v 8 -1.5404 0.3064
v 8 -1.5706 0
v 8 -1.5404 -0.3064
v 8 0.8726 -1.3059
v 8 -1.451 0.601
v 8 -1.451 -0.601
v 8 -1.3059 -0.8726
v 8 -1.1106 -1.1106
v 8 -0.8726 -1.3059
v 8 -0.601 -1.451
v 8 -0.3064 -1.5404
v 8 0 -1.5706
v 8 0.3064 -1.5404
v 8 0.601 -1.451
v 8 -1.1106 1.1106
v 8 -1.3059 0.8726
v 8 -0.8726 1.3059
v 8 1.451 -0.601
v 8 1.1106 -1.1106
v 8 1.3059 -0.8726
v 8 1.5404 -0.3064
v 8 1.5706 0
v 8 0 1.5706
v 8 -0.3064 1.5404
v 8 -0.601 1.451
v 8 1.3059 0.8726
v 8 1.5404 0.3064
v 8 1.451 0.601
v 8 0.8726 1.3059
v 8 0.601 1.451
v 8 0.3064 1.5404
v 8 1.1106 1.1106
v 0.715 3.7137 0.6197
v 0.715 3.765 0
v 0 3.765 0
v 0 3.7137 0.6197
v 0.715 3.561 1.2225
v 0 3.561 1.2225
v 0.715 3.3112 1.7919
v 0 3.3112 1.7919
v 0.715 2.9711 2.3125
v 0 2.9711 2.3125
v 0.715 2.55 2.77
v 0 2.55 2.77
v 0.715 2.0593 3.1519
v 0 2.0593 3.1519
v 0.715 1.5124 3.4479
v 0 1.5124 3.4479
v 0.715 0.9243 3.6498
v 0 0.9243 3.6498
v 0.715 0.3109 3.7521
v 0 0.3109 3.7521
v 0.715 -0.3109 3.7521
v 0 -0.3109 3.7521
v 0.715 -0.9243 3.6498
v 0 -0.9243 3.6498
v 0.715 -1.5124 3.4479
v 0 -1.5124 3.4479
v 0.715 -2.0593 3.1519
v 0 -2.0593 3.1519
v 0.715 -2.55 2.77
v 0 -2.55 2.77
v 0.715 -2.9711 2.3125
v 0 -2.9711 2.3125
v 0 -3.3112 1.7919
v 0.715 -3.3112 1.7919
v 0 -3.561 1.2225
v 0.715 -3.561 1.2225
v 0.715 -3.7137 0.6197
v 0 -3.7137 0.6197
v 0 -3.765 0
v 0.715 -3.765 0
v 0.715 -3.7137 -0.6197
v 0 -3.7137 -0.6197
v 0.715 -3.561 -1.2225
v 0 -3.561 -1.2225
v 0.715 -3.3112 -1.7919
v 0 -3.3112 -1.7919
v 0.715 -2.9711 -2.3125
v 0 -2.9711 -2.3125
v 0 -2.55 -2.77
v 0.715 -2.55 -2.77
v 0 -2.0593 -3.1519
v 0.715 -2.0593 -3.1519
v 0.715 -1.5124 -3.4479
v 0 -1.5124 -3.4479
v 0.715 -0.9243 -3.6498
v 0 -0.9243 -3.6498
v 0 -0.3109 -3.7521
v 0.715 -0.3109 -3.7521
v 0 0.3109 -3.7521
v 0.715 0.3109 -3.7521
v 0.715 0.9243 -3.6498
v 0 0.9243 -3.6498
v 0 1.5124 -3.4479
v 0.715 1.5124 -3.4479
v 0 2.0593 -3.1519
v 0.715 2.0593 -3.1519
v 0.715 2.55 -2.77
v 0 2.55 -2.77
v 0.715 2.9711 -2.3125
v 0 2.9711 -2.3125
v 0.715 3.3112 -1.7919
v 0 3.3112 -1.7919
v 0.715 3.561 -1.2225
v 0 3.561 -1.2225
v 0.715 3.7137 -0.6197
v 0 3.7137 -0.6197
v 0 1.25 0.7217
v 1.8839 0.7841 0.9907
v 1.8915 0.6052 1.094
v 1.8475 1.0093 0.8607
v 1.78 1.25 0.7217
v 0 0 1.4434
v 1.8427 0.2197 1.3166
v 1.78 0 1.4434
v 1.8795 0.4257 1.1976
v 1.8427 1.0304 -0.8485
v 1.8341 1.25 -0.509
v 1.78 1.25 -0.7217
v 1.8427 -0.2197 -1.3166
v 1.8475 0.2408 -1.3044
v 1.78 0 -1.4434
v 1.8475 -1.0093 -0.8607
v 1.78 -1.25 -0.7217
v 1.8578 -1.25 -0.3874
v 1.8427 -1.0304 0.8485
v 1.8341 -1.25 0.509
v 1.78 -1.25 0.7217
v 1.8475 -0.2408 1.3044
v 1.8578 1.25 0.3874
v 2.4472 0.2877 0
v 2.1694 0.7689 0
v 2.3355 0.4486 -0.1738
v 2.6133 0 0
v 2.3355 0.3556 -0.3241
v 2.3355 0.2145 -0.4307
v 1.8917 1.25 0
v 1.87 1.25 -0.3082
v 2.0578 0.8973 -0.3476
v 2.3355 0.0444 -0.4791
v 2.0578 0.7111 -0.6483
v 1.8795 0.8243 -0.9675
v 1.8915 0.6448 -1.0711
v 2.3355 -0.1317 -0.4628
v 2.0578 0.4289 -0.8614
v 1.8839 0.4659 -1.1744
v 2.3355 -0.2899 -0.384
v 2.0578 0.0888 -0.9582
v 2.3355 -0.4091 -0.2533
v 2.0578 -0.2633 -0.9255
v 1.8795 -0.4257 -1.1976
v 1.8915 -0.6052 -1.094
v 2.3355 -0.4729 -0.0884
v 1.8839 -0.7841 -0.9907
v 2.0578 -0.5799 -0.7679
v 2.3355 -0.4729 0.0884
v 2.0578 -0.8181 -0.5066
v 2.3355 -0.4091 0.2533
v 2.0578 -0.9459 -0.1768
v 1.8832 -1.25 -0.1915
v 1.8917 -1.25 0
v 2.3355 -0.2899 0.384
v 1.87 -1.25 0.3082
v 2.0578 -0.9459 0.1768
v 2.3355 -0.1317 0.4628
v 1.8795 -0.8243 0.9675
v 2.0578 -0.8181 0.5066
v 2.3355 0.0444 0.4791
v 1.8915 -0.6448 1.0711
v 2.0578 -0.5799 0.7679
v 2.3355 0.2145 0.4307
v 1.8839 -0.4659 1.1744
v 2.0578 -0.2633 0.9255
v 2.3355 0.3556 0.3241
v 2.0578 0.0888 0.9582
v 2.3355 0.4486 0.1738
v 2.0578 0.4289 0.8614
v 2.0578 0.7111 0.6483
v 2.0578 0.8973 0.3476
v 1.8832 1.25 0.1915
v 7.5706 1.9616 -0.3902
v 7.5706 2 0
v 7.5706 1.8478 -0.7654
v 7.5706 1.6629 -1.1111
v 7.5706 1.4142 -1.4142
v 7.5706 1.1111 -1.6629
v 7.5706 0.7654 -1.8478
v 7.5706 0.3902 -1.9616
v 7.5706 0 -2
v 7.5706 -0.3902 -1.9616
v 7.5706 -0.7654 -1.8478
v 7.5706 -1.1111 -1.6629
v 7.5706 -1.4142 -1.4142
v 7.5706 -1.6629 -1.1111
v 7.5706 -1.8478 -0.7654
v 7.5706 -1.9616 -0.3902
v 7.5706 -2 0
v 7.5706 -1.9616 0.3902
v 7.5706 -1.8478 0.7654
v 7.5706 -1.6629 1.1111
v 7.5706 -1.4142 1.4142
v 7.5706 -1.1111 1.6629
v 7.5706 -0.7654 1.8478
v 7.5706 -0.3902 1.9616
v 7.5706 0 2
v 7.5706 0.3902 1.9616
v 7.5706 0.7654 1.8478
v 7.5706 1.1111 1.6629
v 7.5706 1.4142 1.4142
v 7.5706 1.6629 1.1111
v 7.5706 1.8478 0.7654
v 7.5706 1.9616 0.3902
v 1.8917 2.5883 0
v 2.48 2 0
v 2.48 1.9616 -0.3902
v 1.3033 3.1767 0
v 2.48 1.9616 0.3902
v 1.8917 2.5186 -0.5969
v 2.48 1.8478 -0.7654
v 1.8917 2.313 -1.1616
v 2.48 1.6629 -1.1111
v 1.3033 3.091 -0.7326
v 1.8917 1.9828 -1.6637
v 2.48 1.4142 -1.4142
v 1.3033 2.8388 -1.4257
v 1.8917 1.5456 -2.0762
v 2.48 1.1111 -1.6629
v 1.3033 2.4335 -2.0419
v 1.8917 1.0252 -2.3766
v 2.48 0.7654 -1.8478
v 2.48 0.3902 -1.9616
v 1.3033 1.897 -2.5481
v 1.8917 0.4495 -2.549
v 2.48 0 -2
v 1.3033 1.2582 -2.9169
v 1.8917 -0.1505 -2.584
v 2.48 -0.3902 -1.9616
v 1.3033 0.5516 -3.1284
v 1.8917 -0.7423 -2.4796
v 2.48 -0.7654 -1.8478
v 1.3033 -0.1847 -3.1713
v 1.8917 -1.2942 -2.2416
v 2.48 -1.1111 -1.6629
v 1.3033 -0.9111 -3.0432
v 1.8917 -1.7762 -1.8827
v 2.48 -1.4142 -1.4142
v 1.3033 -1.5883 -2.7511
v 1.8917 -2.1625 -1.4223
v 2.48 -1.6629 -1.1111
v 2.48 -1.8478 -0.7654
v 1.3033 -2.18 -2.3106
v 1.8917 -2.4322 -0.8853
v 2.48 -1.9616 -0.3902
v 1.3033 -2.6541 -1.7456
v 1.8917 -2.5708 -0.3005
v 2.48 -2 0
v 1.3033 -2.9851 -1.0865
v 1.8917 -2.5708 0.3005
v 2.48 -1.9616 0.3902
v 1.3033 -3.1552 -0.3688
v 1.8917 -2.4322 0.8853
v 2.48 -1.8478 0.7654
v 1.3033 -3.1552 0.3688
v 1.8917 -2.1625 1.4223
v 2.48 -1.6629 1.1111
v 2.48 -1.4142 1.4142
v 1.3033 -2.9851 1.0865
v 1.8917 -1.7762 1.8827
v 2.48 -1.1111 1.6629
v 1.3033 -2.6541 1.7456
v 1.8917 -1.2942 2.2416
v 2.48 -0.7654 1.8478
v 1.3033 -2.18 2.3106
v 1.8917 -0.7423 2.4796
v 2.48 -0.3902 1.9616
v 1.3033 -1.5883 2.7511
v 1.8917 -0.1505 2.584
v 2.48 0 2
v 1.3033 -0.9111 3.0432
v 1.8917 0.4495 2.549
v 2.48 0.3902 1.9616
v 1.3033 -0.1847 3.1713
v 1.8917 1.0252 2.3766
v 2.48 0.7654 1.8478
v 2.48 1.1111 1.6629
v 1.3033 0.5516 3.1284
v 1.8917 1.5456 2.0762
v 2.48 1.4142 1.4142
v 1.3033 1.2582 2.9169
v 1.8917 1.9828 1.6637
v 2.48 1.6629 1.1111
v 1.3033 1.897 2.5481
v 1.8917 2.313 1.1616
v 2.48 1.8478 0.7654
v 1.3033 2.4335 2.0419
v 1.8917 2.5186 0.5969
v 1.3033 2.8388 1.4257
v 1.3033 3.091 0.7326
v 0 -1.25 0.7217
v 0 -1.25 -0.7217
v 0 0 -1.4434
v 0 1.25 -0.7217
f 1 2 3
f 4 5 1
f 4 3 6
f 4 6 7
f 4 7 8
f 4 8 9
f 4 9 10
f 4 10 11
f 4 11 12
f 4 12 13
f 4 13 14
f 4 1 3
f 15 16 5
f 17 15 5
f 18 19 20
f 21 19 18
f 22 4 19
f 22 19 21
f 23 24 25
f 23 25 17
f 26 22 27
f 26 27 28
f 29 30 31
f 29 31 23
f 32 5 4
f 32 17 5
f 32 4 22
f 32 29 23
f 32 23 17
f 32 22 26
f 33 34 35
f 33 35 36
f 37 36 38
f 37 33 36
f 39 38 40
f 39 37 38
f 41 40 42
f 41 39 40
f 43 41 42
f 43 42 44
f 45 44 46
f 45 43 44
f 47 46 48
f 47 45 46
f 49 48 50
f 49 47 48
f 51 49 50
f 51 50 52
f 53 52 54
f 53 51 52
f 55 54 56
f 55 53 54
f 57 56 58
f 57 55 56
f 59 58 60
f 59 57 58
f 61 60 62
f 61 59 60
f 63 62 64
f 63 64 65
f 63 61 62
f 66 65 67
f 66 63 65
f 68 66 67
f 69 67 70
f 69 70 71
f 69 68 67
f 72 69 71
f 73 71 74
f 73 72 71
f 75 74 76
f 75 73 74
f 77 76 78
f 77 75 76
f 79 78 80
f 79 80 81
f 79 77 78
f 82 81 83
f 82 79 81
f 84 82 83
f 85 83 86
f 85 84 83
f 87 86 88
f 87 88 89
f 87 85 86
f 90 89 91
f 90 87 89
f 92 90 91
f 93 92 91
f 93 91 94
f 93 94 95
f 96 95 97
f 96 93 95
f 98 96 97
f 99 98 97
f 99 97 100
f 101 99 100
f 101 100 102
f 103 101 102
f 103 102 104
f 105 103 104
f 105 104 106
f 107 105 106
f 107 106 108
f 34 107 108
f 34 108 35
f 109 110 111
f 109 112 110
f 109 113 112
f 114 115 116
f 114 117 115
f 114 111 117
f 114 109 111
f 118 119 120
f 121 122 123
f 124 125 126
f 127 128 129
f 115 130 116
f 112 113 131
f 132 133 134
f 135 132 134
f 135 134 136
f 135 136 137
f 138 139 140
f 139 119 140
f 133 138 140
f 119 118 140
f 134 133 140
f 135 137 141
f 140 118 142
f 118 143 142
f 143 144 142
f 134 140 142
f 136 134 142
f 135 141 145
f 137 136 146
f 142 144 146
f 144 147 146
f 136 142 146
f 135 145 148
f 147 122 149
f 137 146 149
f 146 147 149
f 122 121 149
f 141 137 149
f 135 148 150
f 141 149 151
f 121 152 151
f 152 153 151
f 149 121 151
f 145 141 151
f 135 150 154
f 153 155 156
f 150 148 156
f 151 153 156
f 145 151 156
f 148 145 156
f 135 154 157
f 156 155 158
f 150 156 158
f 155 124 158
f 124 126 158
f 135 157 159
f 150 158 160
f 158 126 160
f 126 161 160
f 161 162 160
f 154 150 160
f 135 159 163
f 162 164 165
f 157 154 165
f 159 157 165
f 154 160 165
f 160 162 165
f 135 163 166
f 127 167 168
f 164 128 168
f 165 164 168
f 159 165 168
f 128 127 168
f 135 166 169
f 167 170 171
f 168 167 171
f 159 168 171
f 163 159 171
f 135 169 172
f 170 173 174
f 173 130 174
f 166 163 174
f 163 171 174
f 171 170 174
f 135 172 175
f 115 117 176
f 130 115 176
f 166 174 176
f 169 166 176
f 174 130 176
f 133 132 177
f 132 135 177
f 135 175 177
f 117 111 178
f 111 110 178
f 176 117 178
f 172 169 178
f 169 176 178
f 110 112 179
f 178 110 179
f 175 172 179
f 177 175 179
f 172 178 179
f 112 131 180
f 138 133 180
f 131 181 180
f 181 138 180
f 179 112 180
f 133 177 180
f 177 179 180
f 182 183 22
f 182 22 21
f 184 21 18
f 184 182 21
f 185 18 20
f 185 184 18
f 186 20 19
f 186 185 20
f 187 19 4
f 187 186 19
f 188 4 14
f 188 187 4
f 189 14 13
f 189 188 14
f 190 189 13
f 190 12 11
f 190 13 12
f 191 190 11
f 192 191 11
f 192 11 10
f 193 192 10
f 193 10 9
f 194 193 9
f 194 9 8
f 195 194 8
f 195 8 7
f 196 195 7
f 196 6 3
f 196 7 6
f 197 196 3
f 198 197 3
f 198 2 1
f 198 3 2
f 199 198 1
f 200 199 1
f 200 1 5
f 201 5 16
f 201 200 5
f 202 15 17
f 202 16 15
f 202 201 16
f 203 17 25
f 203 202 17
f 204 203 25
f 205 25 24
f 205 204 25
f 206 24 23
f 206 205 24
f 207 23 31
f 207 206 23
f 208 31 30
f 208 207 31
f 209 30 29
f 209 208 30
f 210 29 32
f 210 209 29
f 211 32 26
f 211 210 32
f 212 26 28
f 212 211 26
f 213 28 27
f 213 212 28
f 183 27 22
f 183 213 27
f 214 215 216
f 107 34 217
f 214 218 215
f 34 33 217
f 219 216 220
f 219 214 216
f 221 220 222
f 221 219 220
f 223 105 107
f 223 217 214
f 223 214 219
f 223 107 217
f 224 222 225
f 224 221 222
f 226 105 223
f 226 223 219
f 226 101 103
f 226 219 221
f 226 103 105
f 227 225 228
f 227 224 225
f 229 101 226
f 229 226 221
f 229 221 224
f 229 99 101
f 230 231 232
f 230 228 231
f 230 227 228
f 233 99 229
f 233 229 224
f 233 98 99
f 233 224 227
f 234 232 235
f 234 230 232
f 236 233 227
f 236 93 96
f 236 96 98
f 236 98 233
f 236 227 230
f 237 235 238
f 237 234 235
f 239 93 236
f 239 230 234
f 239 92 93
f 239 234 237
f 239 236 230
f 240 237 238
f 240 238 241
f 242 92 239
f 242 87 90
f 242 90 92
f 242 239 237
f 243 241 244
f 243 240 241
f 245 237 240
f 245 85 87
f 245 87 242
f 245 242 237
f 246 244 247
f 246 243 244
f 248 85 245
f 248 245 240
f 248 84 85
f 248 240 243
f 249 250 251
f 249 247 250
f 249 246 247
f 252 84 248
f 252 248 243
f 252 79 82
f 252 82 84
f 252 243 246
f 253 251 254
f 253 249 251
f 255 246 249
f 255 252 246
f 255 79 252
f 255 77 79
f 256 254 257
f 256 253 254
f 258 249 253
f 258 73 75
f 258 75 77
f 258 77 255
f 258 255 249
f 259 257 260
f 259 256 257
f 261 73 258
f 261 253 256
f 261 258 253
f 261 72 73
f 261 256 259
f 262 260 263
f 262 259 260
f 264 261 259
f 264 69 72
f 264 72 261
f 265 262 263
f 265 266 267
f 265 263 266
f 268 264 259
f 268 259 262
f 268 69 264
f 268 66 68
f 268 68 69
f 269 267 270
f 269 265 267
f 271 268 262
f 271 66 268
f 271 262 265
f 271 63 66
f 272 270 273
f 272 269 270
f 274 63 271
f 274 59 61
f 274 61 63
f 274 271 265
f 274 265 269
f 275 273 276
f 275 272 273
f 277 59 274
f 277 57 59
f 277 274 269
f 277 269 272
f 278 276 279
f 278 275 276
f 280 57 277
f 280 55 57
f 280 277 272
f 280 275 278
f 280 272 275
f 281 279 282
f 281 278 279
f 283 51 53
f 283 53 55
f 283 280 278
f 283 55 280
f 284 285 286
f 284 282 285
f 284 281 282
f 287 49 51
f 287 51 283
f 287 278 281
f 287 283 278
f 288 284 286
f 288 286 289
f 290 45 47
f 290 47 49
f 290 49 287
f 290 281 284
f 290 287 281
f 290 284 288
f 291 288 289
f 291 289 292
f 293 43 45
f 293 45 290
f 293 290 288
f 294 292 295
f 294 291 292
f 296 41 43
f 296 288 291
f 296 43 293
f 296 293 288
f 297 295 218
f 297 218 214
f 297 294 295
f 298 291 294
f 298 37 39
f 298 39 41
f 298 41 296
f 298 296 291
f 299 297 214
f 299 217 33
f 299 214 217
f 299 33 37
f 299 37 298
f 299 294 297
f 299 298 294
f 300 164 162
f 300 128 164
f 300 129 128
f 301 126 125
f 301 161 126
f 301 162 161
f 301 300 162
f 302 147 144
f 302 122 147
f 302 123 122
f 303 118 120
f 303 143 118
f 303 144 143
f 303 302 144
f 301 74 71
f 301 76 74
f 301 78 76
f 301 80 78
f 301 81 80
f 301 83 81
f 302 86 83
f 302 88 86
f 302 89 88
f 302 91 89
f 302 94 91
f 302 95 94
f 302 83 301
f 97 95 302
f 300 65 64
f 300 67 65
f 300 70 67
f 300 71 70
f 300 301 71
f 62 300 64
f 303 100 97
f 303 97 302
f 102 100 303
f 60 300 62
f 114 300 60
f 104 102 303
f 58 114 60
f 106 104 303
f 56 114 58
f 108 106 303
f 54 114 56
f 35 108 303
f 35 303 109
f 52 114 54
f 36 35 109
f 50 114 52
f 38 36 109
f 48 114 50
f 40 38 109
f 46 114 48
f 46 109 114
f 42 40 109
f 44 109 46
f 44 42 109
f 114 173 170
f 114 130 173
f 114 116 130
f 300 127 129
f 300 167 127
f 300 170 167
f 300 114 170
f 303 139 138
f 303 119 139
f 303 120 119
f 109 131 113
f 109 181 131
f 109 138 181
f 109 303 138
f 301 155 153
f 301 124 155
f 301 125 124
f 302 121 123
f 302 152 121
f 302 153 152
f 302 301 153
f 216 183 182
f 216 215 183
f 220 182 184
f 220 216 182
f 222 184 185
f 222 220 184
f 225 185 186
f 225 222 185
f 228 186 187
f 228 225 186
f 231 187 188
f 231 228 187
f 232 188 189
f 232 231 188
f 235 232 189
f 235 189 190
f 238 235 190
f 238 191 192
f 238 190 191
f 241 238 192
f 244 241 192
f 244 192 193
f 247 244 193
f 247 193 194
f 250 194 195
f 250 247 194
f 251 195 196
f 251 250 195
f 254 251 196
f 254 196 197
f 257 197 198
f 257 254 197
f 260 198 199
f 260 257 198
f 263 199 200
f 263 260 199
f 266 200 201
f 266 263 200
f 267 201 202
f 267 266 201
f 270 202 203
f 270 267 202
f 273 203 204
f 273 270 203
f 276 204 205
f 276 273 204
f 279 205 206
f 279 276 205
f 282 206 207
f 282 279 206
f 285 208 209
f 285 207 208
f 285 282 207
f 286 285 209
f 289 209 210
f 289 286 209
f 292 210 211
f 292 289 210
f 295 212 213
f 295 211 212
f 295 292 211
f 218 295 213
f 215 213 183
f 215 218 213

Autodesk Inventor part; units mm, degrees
ref_plane "YZ Plane" through (0, 0, 0) normal (1, 0, 0) x (0, 1, 0)
ref_plane "XZ Plane" through (0, 0, 0) normal (0, 1, 0) x (-1, 0, 0)
sketch "Skizze1" plane through (0, 0, 0) normal (0, 0, 1) x (1, 0, 0)
  line L0 (8, 0) -> (8, 2)
  line L1 (8, 2) -> (5, 2)
  line L2 (5, 2) -> (4.5706, 2)
  line L3 (0, 3.765) -> (0, 1.4434)
  line L4 (0, 1.4434) -> (1.78, 1.4434)
  line L5 (1.78, 1.4434) -> (2.6133, 0)
  line L6 (2.6133, 0) -> (8, 0)
  line L7 (0, 3.765) -> (0.715, 3.765)
  line L8 (0.715, 3.765) -> (2.48, 2)
  line L9 (4.5706, 2) -> (2.48, 2)
  line L10 (5, 2) -> (2.48, 2) construction
  line L11 (2.48, 2) -> (2.48, 2)
  line L12 (-1.6, 0) -> (9.6, 0) projected
  line L13 (0, -0.753) -> (0, 4.518) projected
  dimension "d0" = 8
  dimension "d1" = 3
  dimension "d2" = 1.78
  dimension "d3" = 4
  dimension "d6" = 2.48
  dimension "d7" = 45
  dimension "d8" = 2.8868
  dimension "d9" = 60
  dimension "d10" = 7.53
  dimension "d11" = 4
  dimension "d12" = 0.4294
revolve "Körper" add sketch "Skizze1" angle 360 about axis through (2.6133, 0, 0) along (1, 0, 0) contours L6 L5 L4 L3 L7 L8 L9 L2 L1 L0
sketch "Skizze2" plane through (0, 0, 0) normal (-1, 0, 0) x (0, 0, 1)
  circle A0 centre (0, 0) radius 1.4434 projected
  line L0 (0, -5.271) -> (0, 5.271) projected
  line L1 (-5.271, 0) -> (5.271, 0) projected
  line L2 (1.4434, 0) -> (0.7217, -1.25)
  line L3 (0.7217, -1.25) -> (-0.7217, -1.25)
  line L4 (-0.7217, -1.25) -> (-1.4434, 0)
  line L5 (-1.4434, 0) -> (-0.7217, 1.25)
  line L6 (-0.7217, 1.25) -> (0.7217, 1.25)
  line L7 (0.7217, 1.25) -> (1.4434, 0)
  point P0 (0, 1.4434)
extrude "Loch" add sketch "Skizze2" against normal up to next contours L7 A0 | A0 L2 | L6 L0 A0 | A0 L0 L3 | L0 L6 A0 | A0 L3 L0 | L4 A0 | A0 L5
thread "Gewinde" size "M4x0.7" class "6g" standard "ISO Metric profile" length 3
chamfer "Fase1" distance 0.4294 distance2 0.4294 1 edges at (8, -2, 0) measured on face at (8, -0.9581, 0.5552)
ref_plane "Work Plane1" through (104.775, 0, 0) normal (0, 0, -1) x (1, 0, 0)
equation "\"d15\" = GEL"
equation "\"d17\" = -0.5 * SPD + 0.5 * GD"
equation "\"d18\" = GUL"
equation "\"d0\" = NLG"
equation "\"d1\" = GEL"
equation "\"d2\" = INTI"
equation "\"d3\" = GD"
equation "\"d6\" = KOH"
equation "\"d7\" = 0.5 * SEWI"
equation "\"d8\" = 1.1547 * SW"
equation "\"d10\" = KOD"
equation "\"d11\" = BDM"
equation "\"d12\" = GAL"
equation "\"NLG\" = 8"
equation "\"INTI\" = 1.78"
equation "\"GEL\" = 3"
equation "\"GAL\" = 0.61345 * PTC"
equation "\"KOH\" = 2.48"
equation "\"KOD\" = 7.53"
equation "\"GUL\" = 0.61345 * PTC"
equation "\"SPD\" = NND - 1.2269 * PTC"
equation "\"BDM\" = NND"
equation "\"GD\" = NND"
equation "\"SEWI\" = 90deg"
equation "\"SW\" = 2.5"
equation "\"TOA\" = 30deg"
equation "\"GD1\" = THREADDIA - 1.2269 * PTC"
equation "\"EPV\" = 4.48"
equation "\"THREADDIA\" = 4"
equation "\"PTC\" = 0.7"
equation "\"NND\" = 4"
equation "\"E0\" = 2.89"
equation "\"THREADDESC\" = 1.2345"
properties part number "ISO 10642 - M4 x  8" material "Stahl"
